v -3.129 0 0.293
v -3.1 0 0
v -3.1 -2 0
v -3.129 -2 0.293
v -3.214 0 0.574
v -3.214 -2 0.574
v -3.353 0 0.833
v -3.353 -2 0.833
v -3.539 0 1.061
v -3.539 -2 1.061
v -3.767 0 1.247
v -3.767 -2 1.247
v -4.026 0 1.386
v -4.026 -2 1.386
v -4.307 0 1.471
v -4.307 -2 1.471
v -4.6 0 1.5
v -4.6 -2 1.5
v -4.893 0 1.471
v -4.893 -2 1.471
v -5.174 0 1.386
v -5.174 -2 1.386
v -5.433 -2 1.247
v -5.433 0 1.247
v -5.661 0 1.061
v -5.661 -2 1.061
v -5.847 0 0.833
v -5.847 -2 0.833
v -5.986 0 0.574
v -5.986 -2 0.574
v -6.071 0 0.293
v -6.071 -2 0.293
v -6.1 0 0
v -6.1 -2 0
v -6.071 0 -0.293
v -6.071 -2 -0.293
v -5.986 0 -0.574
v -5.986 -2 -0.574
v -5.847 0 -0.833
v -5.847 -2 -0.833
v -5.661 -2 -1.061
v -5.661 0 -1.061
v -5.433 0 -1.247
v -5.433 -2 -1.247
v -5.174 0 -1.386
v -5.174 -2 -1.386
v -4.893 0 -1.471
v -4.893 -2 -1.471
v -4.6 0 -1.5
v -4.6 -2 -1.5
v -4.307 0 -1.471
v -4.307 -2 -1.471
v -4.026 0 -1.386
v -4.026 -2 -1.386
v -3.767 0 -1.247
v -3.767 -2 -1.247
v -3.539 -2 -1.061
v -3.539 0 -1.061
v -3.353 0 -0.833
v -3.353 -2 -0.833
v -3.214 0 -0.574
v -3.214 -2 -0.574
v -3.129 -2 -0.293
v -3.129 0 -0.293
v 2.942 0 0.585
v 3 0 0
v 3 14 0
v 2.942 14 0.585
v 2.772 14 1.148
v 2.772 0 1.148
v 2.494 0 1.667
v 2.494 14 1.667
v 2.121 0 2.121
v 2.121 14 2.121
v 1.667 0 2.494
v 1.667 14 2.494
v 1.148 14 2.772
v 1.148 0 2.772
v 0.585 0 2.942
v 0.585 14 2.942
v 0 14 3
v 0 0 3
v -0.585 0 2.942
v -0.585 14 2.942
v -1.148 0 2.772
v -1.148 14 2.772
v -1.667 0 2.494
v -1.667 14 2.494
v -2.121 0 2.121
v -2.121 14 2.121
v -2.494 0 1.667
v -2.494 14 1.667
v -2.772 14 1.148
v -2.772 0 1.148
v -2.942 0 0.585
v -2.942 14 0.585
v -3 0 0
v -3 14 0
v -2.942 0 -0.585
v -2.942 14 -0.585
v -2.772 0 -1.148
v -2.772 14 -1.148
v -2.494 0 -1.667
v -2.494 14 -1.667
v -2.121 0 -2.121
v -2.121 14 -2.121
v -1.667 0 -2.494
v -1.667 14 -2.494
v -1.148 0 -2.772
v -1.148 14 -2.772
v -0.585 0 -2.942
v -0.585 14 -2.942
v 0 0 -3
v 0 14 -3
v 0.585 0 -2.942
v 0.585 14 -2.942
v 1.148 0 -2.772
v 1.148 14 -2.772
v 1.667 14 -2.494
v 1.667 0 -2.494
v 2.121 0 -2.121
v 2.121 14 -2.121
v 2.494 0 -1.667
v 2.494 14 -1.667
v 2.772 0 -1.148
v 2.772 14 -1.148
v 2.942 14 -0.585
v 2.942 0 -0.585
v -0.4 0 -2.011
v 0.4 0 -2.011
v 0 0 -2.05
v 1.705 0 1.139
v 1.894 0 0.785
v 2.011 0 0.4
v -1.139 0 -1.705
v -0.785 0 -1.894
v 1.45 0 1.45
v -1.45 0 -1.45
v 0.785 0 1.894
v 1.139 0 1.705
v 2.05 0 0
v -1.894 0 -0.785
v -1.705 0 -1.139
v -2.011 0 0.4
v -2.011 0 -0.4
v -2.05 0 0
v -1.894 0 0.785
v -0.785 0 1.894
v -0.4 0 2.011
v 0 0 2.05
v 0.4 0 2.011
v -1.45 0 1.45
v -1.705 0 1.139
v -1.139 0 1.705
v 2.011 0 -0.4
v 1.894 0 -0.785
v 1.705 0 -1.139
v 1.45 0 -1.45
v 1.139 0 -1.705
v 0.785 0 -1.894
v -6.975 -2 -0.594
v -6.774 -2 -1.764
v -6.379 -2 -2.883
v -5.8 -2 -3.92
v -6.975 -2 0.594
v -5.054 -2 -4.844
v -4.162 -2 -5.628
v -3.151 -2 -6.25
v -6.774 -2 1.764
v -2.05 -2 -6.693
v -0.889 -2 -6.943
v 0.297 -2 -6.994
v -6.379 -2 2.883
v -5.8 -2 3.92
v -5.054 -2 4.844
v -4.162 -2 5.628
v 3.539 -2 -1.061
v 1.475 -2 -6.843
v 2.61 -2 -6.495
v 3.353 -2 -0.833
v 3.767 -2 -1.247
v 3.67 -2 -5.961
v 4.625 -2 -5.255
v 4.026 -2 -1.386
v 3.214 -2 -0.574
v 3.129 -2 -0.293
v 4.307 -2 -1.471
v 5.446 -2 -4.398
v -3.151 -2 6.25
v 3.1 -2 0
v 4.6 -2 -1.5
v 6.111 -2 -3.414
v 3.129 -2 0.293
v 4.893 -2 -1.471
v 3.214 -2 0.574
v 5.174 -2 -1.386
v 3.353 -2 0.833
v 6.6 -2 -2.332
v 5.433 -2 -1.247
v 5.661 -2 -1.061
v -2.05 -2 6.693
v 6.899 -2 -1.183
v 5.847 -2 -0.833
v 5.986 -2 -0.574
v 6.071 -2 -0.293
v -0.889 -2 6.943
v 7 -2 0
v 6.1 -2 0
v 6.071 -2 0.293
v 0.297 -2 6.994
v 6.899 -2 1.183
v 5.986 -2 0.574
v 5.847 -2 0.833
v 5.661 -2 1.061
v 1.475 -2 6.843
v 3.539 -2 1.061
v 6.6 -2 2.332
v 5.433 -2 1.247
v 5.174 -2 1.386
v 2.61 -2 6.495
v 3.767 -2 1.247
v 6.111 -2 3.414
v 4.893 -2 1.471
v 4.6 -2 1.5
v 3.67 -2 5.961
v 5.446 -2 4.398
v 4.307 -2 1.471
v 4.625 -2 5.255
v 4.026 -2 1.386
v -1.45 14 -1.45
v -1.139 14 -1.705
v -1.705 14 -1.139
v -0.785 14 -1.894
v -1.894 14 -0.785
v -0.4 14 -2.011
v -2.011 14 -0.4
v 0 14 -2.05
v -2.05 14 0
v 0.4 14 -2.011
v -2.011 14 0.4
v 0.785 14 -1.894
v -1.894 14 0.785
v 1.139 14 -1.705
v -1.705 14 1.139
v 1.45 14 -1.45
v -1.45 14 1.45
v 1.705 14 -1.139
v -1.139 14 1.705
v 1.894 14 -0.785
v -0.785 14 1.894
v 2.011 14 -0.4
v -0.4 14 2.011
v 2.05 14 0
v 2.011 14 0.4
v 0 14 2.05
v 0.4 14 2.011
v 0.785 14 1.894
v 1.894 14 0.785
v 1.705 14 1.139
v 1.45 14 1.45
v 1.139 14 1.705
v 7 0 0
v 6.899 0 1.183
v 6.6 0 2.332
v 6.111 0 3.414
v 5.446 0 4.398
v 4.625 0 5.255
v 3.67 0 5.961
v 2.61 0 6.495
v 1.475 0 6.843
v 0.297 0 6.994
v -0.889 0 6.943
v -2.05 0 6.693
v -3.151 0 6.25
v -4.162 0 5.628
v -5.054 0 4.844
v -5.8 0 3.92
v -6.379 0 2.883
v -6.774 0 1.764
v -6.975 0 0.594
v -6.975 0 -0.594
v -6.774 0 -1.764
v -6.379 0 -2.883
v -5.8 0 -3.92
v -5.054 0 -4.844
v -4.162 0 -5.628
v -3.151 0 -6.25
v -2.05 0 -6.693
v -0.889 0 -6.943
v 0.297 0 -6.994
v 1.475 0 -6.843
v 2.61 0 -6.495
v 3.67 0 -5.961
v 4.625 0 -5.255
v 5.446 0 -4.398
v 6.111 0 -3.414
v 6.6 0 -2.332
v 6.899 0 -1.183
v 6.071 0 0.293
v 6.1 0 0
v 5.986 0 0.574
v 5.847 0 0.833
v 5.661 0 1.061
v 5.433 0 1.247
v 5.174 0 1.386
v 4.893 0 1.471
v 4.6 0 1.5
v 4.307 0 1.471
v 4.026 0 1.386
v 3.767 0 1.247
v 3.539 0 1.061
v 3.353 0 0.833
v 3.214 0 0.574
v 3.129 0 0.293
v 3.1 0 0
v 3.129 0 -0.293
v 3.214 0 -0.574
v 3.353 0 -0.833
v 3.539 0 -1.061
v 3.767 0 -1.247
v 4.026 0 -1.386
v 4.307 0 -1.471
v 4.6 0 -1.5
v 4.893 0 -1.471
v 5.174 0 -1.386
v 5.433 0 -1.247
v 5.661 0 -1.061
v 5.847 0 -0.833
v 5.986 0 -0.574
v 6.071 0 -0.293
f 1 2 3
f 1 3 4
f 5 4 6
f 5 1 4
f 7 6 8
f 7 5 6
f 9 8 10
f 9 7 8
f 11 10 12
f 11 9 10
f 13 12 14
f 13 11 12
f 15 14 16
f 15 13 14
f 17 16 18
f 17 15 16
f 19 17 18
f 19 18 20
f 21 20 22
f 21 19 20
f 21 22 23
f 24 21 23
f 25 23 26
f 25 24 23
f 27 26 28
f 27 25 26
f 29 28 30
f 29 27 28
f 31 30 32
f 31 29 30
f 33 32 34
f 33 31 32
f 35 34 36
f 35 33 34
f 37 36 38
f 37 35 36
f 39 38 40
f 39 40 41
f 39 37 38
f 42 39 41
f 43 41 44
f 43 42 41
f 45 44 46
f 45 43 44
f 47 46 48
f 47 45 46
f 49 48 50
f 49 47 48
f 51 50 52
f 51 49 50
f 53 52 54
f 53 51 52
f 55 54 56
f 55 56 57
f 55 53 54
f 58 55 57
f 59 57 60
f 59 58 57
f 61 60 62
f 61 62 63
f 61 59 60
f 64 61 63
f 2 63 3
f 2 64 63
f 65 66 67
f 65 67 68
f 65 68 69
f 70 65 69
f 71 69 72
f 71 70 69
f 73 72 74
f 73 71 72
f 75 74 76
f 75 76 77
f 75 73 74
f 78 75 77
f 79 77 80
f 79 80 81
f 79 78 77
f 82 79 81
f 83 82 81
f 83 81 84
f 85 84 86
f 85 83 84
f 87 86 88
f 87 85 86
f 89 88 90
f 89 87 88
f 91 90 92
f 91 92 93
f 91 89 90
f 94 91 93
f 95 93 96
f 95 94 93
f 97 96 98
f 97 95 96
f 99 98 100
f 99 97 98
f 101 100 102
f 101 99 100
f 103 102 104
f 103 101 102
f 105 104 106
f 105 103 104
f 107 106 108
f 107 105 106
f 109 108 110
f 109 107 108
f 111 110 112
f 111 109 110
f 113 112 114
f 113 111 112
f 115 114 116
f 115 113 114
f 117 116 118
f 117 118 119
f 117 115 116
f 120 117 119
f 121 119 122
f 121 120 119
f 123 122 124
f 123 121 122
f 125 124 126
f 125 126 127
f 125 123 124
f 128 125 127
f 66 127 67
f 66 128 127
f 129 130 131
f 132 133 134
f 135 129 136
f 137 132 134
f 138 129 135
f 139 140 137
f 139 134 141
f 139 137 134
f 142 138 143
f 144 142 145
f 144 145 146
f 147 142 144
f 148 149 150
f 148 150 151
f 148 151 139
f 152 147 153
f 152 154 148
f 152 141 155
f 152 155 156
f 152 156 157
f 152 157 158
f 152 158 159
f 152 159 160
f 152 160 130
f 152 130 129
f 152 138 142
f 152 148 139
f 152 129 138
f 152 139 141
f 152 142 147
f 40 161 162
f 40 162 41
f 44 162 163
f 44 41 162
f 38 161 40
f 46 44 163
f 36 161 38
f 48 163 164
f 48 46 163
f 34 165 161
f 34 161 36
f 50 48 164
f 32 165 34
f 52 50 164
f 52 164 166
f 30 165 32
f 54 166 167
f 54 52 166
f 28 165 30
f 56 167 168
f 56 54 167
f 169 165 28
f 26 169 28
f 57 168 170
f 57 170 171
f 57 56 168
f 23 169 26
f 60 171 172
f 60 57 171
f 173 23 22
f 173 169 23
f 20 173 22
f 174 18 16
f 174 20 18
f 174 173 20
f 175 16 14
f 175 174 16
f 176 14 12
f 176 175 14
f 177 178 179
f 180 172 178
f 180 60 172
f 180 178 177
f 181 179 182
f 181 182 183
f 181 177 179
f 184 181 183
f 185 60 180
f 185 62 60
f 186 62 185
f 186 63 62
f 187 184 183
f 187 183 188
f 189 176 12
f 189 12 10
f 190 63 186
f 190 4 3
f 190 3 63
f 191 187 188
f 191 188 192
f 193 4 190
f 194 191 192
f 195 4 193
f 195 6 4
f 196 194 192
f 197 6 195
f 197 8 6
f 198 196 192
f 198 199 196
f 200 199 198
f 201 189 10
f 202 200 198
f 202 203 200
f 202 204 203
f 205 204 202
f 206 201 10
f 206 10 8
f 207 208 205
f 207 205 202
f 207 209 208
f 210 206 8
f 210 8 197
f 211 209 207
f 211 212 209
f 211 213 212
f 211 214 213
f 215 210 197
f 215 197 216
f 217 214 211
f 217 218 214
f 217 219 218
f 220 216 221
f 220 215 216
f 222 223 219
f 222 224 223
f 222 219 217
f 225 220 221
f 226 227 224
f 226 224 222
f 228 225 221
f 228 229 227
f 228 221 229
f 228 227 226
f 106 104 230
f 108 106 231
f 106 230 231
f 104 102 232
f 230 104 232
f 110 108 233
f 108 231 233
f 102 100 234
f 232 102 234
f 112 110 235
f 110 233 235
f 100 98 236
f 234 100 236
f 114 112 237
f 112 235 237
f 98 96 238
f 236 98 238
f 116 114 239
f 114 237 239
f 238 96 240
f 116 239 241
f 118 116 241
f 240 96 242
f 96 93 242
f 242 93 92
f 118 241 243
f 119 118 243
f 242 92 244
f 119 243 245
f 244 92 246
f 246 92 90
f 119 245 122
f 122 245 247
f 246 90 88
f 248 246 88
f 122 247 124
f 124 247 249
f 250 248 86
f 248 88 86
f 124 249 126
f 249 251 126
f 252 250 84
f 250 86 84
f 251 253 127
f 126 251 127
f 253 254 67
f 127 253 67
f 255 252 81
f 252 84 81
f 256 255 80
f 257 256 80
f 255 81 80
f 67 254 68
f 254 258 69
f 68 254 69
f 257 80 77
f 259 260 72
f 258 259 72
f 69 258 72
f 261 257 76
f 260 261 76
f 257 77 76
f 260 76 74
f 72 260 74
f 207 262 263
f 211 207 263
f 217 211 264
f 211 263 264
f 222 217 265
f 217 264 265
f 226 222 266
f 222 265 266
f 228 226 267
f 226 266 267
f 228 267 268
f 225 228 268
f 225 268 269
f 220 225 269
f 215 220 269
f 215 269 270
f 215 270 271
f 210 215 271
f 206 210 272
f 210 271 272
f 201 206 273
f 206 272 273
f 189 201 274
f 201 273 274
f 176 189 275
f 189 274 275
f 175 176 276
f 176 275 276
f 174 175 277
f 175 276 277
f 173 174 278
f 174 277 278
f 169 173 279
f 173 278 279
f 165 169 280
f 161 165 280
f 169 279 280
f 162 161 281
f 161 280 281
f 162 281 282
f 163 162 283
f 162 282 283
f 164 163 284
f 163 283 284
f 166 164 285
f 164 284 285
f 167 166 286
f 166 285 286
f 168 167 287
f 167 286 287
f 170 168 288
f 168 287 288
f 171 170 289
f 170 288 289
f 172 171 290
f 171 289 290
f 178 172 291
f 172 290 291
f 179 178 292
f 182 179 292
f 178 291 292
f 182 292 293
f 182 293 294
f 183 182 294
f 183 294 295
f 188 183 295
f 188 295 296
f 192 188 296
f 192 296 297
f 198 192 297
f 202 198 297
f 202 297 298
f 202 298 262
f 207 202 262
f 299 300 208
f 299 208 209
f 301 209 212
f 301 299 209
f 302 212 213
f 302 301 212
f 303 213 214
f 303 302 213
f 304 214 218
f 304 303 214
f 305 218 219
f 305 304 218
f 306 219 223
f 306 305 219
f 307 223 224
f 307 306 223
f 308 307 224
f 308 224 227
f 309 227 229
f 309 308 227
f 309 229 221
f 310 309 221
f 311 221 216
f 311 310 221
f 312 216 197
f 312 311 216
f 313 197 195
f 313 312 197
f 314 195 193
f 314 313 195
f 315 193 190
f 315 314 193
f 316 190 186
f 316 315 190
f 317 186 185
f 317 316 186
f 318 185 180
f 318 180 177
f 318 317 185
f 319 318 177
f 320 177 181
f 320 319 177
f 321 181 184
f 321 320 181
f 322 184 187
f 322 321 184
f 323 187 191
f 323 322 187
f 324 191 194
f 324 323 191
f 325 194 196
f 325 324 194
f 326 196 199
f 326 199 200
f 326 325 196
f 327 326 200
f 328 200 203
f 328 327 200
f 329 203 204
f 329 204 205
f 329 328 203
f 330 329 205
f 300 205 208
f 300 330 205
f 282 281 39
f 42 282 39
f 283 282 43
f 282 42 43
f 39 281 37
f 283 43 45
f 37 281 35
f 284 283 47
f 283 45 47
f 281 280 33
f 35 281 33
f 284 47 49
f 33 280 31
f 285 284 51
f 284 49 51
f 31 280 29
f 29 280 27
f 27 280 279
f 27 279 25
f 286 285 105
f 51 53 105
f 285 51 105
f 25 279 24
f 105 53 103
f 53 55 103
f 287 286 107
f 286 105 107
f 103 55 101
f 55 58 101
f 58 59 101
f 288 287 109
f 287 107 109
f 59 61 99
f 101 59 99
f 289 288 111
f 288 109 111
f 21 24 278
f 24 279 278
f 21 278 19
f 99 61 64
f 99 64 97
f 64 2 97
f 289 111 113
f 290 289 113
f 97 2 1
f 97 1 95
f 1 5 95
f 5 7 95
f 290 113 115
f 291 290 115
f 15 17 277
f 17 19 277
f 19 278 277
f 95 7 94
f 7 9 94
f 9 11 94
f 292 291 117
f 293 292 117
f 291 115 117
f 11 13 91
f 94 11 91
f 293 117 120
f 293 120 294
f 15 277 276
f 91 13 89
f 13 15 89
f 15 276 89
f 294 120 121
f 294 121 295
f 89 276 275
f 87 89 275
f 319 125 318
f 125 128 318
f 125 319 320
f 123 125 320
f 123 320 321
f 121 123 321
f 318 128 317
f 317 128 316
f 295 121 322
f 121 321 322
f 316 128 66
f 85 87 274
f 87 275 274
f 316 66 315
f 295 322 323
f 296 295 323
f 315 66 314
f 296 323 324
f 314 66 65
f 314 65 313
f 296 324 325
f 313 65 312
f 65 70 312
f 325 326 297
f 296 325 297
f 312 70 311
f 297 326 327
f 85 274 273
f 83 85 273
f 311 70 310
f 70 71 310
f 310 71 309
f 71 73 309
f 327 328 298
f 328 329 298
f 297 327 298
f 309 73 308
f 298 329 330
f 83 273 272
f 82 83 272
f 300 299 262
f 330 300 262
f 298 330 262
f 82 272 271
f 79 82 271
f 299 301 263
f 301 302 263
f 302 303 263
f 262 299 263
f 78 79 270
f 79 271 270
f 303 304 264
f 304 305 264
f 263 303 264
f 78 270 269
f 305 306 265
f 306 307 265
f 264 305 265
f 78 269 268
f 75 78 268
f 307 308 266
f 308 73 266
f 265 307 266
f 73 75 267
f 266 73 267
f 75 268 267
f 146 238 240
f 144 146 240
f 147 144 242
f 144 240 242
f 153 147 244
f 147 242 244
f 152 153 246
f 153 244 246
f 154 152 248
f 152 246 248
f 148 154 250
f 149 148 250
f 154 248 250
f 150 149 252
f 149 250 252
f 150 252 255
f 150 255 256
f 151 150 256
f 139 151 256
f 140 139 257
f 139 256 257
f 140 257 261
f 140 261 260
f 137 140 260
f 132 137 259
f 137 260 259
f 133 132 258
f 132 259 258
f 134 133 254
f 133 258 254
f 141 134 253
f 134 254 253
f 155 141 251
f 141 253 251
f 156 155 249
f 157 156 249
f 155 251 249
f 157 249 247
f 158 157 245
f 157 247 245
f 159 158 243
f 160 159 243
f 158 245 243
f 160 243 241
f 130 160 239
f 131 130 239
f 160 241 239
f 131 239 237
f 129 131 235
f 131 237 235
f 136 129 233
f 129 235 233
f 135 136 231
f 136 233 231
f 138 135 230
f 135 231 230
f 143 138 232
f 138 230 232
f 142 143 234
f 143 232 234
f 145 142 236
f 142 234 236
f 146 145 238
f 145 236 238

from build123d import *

# Parameters (mm, degrees)
F0_R     = 7
F0_R_2   = 1.5
F0_R_3   = 3
F1_DEPTH = 2
F2_DEPTH = 14
F3_R     = 2.05
F4_DEPTH = 14


# Not quite as in the source:
# - a feature names something its author has since deleted; it is built from what else it names


with BuildPart() as f1:
    # F0 (on Front) → F1 (new body)
    with BuildSketch(Plane.XZ):
        Circle(F0_R)
        with Locations((-4.6, 0)):
            Circle(F0_R_2, mode=Mode.SUBTRACT)
        Circle(F0_R_3, mode=Mode.SUBTRACT)
        with Locations((4.6, 0)):
            Circle(F0_R_2, mode=Mode.SUBTRACT)
        Circle(F0_R_3)
    extrude(amount=F1_DEPTH)

    # F0 (on Front) → F2 (join)
    with BuildSketch(Plane.XZ):
        Circle(F0_R_3)
    extrude(amount=-F2_DEPTH)

    # F3 (on face) → F4 (cut)
    with BuildSketch(Plane(origin=(0, 14, 0), x_dir=(-1, 0, 0), z_dir=(0, 1, 0))):
        Circle(F3_R)
    extrude(amount=-F4_DEPTH, mode=Mode.SUBTRACT)


solid = f1.part
